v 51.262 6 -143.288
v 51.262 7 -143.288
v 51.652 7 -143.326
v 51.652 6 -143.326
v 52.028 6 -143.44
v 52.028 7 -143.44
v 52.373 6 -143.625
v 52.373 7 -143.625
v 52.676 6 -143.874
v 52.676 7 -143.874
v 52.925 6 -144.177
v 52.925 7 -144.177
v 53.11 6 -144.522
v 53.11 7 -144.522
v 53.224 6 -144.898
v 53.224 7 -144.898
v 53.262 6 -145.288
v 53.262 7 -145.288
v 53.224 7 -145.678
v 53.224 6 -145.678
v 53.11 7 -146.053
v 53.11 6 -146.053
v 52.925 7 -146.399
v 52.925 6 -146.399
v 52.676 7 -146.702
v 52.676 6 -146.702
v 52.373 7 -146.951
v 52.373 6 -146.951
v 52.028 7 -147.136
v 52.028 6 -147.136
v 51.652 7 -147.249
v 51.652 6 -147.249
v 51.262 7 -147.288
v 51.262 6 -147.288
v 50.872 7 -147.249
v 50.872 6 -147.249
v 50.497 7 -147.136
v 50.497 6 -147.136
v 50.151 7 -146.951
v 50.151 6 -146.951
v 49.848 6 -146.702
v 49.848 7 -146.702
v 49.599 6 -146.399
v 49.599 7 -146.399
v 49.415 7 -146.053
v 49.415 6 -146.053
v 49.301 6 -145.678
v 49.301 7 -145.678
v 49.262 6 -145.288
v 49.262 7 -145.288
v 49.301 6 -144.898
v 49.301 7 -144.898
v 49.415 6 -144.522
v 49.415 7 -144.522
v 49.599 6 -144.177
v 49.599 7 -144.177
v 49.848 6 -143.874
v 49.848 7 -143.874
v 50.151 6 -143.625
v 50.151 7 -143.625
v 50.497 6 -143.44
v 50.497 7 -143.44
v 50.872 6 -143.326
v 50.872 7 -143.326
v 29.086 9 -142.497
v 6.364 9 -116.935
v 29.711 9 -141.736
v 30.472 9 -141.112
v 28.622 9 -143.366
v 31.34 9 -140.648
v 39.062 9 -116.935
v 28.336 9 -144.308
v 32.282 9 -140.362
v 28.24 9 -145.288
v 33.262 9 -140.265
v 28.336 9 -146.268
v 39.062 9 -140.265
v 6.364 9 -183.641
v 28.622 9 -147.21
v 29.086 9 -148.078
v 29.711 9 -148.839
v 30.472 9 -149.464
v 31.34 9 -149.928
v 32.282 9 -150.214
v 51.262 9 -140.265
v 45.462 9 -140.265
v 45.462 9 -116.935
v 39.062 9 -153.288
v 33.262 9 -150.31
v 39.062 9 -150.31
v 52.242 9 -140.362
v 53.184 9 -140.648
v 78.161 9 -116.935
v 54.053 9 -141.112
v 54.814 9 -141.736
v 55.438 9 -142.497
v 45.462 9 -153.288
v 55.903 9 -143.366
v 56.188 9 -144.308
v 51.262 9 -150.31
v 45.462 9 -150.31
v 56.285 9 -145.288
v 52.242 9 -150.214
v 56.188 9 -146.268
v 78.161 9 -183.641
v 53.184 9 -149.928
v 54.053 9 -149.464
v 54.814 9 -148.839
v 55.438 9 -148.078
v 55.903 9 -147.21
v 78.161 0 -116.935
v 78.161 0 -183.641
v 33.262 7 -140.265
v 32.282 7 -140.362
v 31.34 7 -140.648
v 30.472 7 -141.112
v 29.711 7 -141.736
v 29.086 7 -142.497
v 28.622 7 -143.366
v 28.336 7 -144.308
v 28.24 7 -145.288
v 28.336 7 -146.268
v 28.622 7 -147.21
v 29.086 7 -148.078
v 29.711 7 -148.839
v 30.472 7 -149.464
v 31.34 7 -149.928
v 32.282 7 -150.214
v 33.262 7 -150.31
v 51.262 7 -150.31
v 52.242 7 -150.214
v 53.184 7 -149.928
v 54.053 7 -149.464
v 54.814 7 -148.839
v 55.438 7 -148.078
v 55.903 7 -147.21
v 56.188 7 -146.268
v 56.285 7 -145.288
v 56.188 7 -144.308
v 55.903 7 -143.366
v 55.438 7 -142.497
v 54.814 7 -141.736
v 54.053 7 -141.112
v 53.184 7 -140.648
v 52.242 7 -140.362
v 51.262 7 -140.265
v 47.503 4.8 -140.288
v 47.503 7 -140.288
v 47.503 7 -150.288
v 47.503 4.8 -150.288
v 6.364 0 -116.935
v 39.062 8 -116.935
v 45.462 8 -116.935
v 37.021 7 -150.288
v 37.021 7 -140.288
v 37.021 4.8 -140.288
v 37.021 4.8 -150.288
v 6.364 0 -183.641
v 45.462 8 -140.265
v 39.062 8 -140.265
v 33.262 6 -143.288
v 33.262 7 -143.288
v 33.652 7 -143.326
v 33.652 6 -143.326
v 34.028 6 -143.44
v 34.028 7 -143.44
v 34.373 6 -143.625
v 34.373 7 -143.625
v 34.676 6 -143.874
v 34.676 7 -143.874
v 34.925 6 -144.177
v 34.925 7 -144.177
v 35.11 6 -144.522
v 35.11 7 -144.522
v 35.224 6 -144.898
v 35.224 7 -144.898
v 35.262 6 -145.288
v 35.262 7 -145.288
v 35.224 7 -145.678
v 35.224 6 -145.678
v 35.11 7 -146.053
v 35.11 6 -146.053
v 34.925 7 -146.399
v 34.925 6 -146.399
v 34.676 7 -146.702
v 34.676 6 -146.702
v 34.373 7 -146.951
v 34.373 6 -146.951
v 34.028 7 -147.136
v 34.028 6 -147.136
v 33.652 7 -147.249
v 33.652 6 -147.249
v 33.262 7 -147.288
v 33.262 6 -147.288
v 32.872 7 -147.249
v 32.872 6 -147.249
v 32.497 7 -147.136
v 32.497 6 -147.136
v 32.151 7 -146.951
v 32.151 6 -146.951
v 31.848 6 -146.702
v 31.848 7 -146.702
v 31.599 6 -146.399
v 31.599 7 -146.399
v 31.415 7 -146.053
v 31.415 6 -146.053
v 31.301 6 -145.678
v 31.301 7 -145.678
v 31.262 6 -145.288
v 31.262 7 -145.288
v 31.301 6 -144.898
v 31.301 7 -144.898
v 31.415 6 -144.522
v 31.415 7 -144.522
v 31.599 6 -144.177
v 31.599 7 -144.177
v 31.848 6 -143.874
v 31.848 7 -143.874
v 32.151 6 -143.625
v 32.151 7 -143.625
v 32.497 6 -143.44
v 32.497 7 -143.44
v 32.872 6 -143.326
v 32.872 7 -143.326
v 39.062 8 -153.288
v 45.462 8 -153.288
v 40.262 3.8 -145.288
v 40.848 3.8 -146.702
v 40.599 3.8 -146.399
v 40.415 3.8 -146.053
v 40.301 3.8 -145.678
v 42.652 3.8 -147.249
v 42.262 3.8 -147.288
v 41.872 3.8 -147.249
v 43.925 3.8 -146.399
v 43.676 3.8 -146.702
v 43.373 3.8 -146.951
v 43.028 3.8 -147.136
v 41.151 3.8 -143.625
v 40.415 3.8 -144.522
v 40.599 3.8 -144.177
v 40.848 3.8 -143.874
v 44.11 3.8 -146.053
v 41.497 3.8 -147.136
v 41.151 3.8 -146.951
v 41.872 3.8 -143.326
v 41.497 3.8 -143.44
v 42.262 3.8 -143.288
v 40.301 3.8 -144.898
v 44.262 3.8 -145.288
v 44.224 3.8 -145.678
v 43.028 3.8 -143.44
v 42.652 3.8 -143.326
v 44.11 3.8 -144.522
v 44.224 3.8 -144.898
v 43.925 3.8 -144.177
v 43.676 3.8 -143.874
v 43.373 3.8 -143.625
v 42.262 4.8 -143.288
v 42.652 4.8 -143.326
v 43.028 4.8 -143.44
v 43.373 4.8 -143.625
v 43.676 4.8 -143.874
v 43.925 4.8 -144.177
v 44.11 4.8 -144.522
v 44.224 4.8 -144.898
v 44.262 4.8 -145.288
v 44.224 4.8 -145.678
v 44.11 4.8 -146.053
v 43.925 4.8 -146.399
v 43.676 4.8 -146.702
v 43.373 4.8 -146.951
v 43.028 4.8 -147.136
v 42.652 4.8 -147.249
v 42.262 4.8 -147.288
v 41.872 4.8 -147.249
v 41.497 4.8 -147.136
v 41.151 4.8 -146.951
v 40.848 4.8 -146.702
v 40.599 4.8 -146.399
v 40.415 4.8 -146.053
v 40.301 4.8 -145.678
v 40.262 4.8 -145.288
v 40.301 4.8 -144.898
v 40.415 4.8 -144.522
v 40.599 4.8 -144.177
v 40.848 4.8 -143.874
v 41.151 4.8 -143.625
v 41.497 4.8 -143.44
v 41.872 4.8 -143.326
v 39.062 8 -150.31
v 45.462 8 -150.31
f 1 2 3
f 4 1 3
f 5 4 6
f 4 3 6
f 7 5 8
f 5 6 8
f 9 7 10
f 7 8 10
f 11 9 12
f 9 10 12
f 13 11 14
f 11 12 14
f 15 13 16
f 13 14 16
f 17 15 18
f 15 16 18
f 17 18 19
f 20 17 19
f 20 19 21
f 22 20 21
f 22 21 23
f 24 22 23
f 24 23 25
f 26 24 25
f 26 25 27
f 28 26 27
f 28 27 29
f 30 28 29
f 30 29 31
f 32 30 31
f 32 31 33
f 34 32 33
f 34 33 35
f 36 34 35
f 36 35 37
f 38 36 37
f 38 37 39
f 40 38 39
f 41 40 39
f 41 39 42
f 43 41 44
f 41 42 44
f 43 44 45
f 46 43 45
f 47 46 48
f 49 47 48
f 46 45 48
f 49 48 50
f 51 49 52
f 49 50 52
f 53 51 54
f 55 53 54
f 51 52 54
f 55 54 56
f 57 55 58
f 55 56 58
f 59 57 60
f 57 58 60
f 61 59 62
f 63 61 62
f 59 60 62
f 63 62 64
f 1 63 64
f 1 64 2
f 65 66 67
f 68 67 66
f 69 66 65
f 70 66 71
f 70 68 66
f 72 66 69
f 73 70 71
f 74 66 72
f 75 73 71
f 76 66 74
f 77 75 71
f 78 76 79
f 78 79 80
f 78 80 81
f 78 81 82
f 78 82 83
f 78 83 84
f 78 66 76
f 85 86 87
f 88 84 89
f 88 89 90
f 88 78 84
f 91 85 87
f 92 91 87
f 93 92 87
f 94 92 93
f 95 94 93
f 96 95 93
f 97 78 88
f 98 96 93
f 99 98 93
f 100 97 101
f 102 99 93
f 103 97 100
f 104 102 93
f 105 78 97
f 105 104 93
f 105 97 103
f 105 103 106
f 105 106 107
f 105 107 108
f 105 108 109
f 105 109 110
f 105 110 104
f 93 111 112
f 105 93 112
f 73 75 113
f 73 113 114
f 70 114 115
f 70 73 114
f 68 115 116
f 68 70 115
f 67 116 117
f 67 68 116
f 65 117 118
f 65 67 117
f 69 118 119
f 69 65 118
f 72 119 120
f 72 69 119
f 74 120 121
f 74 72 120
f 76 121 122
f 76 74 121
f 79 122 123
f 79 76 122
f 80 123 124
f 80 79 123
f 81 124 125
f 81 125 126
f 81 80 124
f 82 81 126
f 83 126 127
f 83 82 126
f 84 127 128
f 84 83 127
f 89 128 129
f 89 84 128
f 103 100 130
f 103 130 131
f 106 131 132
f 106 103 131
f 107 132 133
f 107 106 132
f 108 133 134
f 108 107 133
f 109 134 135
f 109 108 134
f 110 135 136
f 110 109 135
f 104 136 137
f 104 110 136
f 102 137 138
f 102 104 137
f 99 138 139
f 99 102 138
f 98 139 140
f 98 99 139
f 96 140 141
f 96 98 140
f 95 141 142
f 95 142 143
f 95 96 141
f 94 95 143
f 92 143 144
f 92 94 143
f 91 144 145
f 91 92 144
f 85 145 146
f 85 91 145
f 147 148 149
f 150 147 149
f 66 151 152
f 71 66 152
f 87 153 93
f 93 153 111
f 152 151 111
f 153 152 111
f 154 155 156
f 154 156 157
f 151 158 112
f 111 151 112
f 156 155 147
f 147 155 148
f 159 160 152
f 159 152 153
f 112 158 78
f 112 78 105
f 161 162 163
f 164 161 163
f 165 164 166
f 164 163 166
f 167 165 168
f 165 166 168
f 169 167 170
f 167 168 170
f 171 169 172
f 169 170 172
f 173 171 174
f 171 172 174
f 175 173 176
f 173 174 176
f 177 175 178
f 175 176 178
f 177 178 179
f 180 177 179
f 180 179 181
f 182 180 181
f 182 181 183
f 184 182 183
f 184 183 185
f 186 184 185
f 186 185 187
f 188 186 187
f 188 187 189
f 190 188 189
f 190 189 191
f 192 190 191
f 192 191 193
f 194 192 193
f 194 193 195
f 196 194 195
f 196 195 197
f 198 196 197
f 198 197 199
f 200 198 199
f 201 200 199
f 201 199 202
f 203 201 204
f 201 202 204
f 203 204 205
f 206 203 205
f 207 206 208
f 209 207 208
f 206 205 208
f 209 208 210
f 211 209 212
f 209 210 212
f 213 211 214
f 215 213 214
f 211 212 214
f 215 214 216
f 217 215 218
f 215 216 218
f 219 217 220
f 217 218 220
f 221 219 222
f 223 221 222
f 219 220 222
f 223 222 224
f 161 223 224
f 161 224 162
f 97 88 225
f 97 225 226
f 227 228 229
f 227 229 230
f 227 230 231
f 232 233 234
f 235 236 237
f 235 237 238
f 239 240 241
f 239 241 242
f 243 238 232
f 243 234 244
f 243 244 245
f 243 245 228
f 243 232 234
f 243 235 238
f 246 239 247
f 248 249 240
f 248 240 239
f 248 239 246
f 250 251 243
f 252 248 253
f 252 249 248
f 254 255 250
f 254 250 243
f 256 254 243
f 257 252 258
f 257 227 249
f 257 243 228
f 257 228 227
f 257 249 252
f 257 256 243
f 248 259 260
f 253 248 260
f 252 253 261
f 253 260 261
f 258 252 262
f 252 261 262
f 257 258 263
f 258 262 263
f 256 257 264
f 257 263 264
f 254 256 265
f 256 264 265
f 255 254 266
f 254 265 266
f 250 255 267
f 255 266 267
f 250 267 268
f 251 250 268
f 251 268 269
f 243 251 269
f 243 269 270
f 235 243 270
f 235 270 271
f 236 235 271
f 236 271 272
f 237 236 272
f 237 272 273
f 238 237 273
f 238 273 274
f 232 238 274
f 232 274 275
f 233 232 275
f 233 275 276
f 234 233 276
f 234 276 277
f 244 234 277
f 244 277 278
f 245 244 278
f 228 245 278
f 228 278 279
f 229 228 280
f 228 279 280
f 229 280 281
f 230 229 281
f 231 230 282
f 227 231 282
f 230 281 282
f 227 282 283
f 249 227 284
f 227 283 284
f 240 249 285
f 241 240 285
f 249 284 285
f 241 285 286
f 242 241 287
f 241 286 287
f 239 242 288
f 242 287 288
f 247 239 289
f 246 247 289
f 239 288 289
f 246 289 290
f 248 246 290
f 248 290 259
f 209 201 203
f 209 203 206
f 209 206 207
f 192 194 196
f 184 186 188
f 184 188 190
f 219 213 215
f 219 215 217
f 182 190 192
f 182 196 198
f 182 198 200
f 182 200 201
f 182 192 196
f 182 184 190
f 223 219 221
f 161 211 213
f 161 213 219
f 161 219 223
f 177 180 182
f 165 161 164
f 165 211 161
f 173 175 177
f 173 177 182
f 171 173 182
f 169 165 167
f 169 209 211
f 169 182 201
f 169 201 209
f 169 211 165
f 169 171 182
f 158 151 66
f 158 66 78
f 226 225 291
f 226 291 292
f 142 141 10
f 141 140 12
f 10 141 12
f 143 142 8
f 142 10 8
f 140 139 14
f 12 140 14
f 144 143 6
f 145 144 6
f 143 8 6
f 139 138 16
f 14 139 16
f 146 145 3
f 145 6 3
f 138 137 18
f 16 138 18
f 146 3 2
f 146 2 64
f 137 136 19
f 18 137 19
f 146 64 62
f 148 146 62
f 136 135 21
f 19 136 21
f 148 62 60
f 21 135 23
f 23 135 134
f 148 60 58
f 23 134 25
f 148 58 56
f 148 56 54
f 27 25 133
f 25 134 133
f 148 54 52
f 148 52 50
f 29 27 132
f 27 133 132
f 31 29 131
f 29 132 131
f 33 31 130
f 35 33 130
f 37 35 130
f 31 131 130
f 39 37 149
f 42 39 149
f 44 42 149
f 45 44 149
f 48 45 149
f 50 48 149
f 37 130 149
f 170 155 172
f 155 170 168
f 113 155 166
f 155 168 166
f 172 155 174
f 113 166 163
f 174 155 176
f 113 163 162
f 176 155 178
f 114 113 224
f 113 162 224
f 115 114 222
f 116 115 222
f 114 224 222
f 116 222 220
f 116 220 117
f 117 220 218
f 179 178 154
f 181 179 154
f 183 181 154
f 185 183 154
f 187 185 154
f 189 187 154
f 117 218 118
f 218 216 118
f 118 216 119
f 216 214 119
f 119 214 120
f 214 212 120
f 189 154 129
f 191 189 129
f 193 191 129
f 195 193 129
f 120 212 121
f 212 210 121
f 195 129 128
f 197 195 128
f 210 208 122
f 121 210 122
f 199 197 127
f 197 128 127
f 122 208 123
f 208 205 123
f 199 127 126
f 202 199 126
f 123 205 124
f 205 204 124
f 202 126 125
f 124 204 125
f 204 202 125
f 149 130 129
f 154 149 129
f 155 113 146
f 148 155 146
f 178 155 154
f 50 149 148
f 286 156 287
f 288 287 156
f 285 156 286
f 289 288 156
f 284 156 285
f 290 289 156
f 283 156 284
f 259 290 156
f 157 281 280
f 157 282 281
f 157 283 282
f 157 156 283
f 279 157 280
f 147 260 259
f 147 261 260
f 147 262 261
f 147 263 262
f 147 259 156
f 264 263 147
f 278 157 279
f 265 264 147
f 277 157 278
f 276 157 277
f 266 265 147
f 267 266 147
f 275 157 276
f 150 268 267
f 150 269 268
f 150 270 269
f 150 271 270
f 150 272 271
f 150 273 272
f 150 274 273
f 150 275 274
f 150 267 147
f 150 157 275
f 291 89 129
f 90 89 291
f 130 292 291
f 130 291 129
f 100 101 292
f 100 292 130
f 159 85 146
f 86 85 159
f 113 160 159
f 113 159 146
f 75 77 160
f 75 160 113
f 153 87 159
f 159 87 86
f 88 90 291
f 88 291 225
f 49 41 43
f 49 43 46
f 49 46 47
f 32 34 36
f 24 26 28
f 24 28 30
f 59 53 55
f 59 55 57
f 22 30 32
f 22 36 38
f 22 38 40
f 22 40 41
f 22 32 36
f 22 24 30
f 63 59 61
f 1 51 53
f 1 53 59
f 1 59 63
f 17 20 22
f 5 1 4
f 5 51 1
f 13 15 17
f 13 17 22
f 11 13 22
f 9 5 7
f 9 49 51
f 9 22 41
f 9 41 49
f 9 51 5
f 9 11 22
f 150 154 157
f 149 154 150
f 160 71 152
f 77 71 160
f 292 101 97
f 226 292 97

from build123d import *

# Parameters (mm, degrees)
CROQUIS1_W                = 71.796950719
CROQUIS1_H                = 66.705557785
SALIENTE_EXTRUIR1_DEPTH   = 10
CORTAR_EXTRUIR1_DEPTH     = 3
CROQUIS4_R                = 2
CORTAR_EXTRUIR3_DEPTH     = 4
CORTAR_EXTRUIR4_START     = -1
CORTAR_EXTRUIR4_OUTLINE_W = 71.796950719
CORTAR_EXTRUIR4_OUTLINE_H = 66.705557785
CORTAR_EXTRUIR4_DEPTH     = 1
CROQUIS6_W                = 10.482335709
CROQUIS6_H                = 10
CORTAR_EXTRUIR5_DEPTH     = 5.2
CROQUIS7_R                = 2
CORTAR_EXTRUIR6_DEPTH     = 6.2
CROQUIS8_W                = 6.4
CROQUIS8_H                = 36.352778893
CORTAR_EXTRUIR7_DEPTH     = 1


# Read off the part's stored shape, not the designer's step: Cortar-Extruir4
with BuildPart() as part:
    # Croquis1 → Saliente-Extruir1 (new body)
    with BuildSketch(Plane(origin=(0, 0, 0), x_dir=(1, 0, 0), z_dir=(0, 1, 0))):
        with Locations((42.262259736, 150.287845226)):
            Rectangle(CROQUIS1_W, CROQUIS1_H)
    extrude(amount=SALIENTE_EXTRUIR1_DEPTH)

    # Croquis3 → Cortar-Extruir1 (cut)
    with BuildSketch(Plane(origin=(0, 10, 0), x_dir=(1, 0, 0), z_dir=(0, 1, 0))):
        with BuildLine():
            Line((33.262259735, 150.310457053), (51.262259735, 150.310457053))
            ThreePointArc((51.262259735, 150.310457053), (56.284871563, 145.287845226), (51.262259735, 140.265233398))
            Line((51.262259735, 140.265233398), (33.262259735, 140.265233398))
            ThreePointArc((33.262259735, 140.265233398), (28.239647907, 145.287845226), (33.262259735, 150.310457053))
        make_face()
    extrude(amount=-CORTAR_EXTRUIR1_DEPTH, mode=Mode.SUBTRACT)

    # Croquis4 → Cortar-Extruir3 (cut)
    with BuildSketch(Plane(origin=(0, 10, 0), x_dir=(1, 0, 0), z_dir=(0, 1, 0))):
        with Locations(Location((51.262259735, 145.287845226, 0), (0, 0, 270))):
            Circle(CROQUIS4_R)
        with Locations(Location((33.262259735, 145.287845226, 0), (0, 0, 270))):
            Circle(CROQUIS4_R)
    extrude(amount=-CORTAR_EXTRUIR3_DEPTH, mode=Mode.SUBTRACT)

    # Cortar-Extruir4 outline → Cortar-Extruir4 (cut)
    with BuildSketch(Plane(origin=(0, 10, 0), x_dir=(1, 0, 0), z_dir=(0, 1, 0)).offset(CORTAR_EXTRUIR4_START)):
        with Locations((42.262259736, 150.287845226)):
            Rectangle(CORTAR_EXTRUIR4_OUTLINE_W, CORTAR_EXTRUIR4_OUTLINE_H)
        with BuildLine():
            ThreePointArc((33.262259735, 140.265233398), (28.239647907, 145.287845226), (33.262259735, 150.310457053))
            Line((33.262259735, 150.310457053), (51.262259735, 150.310457053))
            ThreePointArc((51.262259735, 150.310457053), (56.284871563, 145.287845226), (51.262259735, 140.265233398))
            Line((51.262259735, 140.265233398), (33.262259735, 140.265233398))
        make_face(mode=Mode.SUBTRACT)
    extrude(amount=CORTAR_EXTRUIR4_DEPTH, mode=Mode.SUBTRACT)

    # Croquis6 → Cortar-Extruir5 (cut)
    with BuildSketch(Plane(origin=(0, 10, 0), x_dir=(1, 0, 0), z_dir=(0, 1, 0))):
        with Locations((42.262259736, 145.287845226)):
            Rectangle(CROQUIS6_W, CROQUIS6_H)
    extrude(amount=-CORTAR_EXTRUIR5_DEPTH, mode=Mode.SUBTRACT)

    # Croquis7 → Cortar-Extruir6 (cut)
    with BuildSketch(Plane(origin=(0, 10, 0), x_dir=(1, 0, 0), z_dir=(0, 1, 0))):
        with Locations(Location((42.262259735, 145.287845226, 0), (0, 0, 270))):
            Circle(CROQUIS7_R)
    extrude(amount=-CORTAR_EXTRUIR6_DEPTH, mode=Mode.SUBTRACT)

    # Croquis8 → Cortar-Extruir7 (cut)
    with BuildSketch(Plane(origin=(0, 9, 0), x_dir=(1, 0, 0), z_dir=(0, 1, 0))):
        with Locations((42.262259735, 135.11145578)):
            Rectangle(CROQUIS8_W, CROQUIS8_H)
    extrude(amount=-CORTAR_EXTRUIR7_DEPTH, mode=Mode.SUBTRACT)


solid = part.part
